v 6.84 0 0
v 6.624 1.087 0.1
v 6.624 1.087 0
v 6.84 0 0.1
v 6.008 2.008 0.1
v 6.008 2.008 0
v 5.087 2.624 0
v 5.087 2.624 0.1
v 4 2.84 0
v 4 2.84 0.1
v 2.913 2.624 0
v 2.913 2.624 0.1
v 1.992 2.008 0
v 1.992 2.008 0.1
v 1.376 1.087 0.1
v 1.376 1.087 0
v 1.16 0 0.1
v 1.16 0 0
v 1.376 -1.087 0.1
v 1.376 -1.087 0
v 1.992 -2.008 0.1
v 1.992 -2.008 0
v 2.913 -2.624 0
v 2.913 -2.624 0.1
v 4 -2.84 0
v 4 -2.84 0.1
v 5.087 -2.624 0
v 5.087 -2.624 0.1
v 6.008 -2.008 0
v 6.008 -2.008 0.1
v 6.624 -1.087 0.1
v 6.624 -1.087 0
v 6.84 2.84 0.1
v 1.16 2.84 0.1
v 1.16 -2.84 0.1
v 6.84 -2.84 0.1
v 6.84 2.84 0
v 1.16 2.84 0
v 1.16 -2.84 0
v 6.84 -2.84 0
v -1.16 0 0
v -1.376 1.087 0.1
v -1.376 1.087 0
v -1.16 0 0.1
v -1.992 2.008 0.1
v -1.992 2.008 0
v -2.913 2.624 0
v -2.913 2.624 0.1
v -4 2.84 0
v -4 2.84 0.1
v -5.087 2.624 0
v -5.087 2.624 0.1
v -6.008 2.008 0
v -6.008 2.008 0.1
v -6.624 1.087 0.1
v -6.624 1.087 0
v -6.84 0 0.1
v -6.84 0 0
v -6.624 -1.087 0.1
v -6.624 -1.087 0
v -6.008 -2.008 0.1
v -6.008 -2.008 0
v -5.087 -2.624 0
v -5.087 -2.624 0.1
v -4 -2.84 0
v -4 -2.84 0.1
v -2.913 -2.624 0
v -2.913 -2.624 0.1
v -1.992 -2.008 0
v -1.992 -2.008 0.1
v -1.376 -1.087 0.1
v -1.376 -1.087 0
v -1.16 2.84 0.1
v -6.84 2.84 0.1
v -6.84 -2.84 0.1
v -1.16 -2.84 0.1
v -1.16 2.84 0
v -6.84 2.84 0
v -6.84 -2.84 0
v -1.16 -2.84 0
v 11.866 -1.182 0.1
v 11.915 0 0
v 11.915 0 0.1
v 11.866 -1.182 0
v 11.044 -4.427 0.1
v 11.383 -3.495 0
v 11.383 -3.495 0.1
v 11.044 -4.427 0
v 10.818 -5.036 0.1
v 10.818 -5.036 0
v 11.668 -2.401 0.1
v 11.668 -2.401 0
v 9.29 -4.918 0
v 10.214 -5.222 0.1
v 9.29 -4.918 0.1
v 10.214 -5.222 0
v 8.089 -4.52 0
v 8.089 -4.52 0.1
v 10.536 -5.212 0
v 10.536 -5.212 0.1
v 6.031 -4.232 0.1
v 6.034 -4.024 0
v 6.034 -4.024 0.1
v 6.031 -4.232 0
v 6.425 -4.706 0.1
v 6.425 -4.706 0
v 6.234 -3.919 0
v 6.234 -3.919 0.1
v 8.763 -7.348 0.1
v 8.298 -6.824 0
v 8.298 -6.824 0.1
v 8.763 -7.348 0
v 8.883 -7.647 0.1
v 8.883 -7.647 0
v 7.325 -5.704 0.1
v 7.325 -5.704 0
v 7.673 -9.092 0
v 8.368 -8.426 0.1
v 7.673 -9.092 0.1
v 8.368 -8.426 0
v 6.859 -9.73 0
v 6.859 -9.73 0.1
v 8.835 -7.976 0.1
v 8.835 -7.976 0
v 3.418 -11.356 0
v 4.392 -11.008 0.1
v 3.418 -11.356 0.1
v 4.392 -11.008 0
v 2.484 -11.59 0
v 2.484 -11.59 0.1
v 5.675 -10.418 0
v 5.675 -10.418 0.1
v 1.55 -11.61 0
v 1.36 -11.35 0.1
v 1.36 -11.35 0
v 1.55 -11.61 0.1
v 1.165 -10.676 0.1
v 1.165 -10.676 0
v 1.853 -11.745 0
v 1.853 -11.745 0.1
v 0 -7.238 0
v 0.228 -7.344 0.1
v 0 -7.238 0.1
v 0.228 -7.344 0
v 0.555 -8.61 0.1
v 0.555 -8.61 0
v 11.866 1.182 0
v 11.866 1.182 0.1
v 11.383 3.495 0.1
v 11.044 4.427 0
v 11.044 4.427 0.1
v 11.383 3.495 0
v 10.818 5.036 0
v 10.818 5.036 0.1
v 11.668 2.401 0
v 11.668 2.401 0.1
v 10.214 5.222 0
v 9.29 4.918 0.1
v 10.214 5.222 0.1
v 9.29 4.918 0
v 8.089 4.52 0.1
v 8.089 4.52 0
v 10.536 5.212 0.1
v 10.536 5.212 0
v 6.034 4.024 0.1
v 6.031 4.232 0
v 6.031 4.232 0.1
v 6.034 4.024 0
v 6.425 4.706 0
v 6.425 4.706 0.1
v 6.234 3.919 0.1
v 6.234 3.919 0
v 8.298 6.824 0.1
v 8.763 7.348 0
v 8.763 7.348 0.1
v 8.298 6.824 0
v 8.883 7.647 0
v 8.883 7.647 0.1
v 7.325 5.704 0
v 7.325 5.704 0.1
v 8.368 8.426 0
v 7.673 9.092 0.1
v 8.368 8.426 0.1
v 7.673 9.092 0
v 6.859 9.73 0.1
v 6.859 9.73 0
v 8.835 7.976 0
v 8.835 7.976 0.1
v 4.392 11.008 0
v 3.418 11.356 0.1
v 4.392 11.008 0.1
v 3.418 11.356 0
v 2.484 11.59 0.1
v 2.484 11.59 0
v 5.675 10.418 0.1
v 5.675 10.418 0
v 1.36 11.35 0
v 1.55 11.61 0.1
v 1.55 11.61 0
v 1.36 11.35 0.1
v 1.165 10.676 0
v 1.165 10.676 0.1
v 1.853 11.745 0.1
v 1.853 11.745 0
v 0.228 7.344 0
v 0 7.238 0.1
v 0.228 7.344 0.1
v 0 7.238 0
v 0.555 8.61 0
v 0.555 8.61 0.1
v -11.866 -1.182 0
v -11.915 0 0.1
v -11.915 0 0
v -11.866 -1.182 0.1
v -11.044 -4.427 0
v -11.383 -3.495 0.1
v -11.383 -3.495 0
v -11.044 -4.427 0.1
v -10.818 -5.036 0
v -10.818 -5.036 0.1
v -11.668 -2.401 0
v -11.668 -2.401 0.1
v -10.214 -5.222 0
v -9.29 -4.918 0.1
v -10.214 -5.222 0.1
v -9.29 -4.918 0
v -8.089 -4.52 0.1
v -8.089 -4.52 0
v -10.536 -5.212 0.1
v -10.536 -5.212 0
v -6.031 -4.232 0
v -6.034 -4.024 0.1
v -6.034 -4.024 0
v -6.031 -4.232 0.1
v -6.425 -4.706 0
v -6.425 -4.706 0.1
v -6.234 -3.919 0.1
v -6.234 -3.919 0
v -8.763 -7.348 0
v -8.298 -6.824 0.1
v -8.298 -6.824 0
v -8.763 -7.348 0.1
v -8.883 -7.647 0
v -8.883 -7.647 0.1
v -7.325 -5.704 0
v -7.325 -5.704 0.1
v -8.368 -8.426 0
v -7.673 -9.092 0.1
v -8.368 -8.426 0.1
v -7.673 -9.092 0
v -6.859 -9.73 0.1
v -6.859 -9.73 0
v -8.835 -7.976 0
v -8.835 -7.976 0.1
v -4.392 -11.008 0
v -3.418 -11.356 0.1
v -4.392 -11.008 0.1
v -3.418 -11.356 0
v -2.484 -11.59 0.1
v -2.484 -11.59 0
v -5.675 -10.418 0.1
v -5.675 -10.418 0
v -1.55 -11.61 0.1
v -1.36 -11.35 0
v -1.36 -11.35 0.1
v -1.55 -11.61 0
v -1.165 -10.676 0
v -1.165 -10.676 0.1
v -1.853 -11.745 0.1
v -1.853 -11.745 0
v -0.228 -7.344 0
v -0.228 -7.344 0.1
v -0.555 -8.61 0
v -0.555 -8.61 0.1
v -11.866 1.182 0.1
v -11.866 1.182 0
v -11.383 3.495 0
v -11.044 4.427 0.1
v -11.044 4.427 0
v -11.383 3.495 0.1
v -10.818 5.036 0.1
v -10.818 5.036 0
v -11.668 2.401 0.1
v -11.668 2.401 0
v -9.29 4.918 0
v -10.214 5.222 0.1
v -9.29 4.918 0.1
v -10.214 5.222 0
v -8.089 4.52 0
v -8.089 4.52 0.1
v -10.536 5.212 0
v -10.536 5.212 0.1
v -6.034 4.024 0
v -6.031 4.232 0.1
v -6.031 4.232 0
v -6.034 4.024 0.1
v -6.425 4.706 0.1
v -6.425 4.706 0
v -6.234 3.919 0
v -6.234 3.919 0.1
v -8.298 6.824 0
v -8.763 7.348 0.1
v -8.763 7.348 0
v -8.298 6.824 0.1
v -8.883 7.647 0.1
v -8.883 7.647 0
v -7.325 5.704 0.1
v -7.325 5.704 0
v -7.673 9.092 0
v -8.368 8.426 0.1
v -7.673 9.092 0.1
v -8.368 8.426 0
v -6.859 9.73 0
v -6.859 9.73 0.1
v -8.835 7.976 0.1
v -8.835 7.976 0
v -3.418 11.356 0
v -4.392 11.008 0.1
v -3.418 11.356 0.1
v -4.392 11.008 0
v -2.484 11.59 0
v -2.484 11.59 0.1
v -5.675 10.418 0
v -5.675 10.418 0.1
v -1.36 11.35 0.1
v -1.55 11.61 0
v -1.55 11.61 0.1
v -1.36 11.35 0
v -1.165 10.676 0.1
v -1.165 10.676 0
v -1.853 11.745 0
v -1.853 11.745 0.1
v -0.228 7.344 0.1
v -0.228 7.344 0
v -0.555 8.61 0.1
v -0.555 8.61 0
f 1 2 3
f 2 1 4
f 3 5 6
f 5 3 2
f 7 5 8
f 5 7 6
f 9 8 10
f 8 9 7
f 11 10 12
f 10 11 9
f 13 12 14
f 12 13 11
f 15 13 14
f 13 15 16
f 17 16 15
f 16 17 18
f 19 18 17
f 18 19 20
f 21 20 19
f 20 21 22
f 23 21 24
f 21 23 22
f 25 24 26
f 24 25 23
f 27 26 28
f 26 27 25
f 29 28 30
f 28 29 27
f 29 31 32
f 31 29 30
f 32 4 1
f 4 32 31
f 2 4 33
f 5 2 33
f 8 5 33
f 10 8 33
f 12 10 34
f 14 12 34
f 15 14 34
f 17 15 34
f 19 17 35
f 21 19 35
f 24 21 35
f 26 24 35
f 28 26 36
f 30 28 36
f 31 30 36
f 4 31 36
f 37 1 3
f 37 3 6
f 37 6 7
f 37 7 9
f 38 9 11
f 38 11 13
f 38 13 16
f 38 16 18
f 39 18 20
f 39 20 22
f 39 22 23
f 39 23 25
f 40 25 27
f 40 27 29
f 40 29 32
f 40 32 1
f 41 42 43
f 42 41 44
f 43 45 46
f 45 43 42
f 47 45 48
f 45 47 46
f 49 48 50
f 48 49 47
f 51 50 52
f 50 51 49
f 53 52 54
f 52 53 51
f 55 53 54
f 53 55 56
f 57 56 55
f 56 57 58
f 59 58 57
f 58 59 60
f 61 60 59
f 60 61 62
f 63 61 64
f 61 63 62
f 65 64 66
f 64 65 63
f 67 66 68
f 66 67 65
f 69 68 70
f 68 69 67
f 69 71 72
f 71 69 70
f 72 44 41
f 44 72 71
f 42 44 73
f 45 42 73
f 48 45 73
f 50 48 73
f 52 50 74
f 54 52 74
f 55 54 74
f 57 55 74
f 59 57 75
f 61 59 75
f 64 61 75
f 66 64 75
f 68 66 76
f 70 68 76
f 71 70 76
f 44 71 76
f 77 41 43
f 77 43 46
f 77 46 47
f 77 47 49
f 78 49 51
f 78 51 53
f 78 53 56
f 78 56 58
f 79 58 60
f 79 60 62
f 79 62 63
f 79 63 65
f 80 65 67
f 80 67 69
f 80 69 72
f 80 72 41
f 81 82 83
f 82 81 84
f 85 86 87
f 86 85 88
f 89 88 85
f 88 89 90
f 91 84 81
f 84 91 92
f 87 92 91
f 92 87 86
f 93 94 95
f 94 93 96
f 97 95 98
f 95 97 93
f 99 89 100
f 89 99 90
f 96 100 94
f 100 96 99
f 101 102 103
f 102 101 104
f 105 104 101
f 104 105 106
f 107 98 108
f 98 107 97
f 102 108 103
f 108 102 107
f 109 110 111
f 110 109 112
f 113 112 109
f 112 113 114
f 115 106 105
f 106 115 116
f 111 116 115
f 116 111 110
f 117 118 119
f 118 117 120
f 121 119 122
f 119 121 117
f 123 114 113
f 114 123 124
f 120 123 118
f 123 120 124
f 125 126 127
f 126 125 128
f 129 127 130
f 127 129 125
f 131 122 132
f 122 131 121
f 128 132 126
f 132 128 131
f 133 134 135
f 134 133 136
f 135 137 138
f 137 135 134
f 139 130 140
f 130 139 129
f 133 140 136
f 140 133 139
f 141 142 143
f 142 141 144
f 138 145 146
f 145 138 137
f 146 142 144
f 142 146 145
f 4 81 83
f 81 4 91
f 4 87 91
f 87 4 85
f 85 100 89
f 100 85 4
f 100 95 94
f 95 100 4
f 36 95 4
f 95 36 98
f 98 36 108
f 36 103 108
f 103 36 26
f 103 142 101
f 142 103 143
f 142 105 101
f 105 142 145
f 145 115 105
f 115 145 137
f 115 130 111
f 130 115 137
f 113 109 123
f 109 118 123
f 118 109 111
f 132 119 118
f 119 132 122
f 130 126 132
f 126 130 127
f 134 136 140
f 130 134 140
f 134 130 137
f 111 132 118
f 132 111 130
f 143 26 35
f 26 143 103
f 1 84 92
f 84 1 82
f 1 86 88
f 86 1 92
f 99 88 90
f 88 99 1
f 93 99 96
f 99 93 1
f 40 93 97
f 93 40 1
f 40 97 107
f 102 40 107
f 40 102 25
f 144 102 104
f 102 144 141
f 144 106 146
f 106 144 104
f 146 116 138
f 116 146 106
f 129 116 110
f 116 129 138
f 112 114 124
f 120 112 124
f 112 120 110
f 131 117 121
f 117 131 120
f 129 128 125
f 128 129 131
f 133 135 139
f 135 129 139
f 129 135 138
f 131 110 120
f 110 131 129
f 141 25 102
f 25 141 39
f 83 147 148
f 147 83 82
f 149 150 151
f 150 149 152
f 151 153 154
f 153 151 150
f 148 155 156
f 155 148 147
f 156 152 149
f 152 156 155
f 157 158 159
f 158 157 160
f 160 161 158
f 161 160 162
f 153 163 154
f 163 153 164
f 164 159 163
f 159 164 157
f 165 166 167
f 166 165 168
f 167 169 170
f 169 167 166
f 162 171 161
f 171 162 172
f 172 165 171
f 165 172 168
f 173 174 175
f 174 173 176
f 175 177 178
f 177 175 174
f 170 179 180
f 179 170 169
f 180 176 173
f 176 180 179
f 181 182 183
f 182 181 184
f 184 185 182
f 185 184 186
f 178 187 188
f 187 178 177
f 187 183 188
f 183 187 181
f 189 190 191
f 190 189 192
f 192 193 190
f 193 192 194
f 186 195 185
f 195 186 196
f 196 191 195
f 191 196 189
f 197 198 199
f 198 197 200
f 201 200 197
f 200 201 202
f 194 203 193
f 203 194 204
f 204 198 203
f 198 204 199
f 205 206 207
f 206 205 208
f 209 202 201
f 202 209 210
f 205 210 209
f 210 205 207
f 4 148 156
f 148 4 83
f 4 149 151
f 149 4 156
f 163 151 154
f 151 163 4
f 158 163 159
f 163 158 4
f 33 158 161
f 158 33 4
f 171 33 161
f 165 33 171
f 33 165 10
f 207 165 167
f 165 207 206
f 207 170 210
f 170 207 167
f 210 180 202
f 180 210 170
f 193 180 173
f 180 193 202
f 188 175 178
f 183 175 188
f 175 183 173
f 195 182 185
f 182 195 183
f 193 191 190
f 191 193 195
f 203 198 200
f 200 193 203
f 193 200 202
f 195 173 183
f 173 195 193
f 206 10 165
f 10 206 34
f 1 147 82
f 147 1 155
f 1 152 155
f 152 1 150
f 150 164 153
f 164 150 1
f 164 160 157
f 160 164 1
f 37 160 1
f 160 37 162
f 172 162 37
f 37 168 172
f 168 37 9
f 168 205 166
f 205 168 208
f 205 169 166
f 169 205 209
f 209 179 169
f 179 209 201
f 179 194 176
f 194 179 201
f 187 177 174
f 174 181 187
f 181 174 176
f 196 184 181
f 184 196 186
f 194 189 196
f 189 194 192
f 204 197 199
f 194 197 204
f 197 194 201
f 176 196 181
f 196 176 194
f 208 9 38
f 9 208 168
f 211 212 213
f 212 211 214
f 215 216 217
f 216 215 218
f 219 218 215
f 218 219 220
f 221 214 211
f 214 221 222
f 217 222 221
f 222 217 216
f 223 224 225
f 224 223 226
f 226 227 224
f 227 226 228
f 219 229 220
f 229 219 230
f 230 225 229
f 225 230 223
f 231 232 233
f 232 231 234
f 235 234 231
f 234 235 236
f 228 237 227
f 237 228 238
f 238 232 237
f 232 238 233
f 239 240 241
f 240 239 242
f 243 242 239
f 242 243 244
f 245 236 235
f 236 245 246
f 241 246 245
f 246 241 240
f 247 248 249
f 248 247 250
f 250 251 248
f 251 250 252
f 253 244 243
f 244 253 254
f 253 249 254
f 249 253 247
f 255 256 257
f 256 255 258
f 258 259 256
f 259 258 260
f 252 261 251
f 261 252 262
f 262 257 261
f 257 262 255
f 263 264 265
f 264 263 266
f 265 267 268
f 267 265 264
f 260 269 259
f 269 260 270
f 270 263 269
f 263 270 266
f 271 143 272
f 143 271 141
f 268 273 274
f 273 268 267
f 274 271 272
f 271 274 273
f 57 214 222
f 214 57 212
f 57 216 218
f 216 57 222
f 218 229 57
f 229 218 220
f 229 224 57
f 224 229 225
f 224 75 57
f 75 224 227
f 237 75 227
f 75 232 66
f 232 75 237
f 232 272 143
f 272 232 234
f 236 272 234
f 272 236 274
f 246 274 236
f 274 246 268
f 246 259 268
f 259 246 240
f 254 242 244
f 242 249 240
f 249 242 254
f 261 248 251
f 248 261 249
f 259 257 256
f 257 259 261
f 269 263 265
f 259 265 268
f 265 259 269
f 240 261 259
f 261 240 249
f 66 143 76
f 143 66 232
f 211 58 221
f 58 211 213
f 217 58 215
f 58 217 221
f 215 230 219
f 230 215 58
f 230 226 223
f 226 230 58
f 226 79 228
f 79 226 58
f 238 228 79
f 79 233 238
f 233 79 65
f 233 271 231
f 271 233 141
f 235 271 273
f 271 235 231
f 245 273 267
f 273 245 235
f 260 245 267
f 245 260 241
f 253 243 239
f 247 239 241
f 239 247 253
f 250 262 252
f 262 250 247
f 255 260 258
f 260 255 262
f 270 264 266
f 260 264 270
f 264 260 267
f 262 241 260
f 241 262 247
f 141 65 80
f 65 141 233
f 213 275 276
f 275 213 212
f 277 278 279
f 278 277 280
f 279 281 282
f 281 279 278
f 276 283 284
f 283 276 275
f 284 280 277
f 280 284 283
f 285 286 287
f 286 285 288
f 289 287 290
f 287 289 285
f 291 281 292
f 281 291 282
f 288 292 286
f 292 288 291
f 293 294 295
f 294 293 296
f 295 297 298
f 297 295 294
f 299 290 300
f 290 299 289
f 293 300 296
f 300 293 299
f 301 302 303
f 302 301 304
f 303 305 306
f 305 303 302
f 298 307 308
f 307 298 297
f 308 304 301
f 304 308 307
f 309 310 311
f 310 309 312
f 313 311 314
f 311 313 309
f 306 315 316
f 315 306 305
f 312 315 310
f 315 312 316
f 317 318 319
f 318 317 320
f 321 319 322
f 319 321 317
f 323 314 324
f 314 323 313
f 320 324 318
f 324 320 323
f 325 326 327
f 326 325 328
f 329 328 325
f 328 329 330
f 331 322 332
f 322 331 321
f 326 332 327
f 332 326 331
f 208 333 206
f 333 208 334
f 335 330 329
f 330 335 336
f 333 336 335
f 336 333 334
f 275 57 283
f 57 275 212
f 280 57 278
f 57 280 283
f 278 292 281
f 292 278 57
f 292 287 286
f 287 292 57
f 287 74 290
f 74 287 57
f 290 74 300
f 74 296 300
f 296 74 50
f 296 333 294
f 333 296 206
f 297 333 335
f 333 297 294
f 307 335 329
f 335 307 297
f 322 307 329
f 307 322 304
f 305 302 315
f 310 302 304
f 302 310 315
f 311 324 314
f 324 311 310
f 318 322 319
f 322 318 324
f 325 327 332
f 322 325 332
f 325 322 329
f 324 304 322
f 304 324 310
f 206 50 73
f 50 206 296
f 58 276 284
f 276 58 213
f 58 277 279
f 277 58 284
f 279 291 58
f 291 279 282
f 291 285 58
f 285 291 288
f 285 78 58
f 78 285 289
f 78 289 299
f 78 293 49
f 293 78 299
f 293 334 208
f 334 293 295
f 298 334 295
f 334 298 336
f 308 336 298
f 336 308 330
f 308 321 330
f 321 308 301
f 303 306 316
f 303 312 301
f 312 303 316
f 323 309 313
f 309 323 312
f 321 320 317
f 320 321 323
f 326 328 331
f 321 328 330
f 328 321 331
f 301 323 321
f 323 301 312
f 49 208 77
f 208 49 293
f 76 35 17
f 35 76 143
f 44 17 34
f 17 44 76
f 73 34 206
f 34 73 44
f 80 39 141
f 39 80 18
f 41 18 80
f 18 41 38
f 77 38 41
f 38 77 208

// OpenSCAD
// file: ../p/4-4edge.scad
use <../lib.scad>
function ldraw_lib__4_4edge() = [
// 0 Circle 1.0
// 0 Name: 4-4edge.dat
// 0 Author: James Jessiman
// 0 !LDRAW_ORG Primitive UPDATE 2017-01
// 0 !LICENSE Licensed under CC BY 4.0 : see CAreadme.txt
// 
// 0 BFC CERTIFY CCW
  [0,"BFC","CERTIFY"],
  [0,"BFC","CCW"],
// 
// 0 !HISTORY 1998-12-15 [PTadmin] Official Update 1998-10
// 0 !HISTORY 2005-12-28 [PTadmin] Official Update 2005-01
// 0 !HISTORY 2007-06-24 [PTadmin] Header formatted for Contributor Agreement
// 0 !HISTORY 2008-07-01 [PTadmin] Official Update 2008-01
// 0 !HISTORY 2017-01-15 [Steffen] BFCed
// 0 !HISTORY 2017-12-30 [PTadmin] Official Update 2017-01
// 
// 
// 2 24 1 0 0 0.9239 0 0.3827
  [2,24,1,0,0,0.9239,0,0.3827],
// 2 24 0.9239 0 0.3827 0.7071 0 0.7071
  [2,24,0.9239,0,0.3827,0.7071,0,0.7071],
// 2 24 0.7071 0 0.7071 0.3827 0 0.9239
  [2,24,0.7071,0,0.7071,0.3827,0,0.9239],
// 2 24 0.3827 0 0.9239 0 0 1
  [2,24,0.3827,0,0.9239,0,0,1],
// 2 24 0 0 1 -0.3827 0 0.9239
  [2,24,0,0,1,-0.3827,0,0.9239],
// 2 24 -0.3827 0 0.9239 -0.7071 0 0.7071
  [2,24,-0.3827,0,0.9239,-0.7071,0,0.7071],
// 2 24 -0.7071 0 0.7071 -0.9239 0 0.3827
  [2,24,-0.7071,0,0.7071,-0.9239,0,0.3827],
// 2 24 -0.9239 0 0.3827 -1 0 -0
  [2,24,-0.9239,0,0.3827,-1,0,-0],
// 2 24 -1 0 -0 -0.9239 0 -0.3827
  [2,24,-1,0,-0,-0.9239,0,-0.3827],
// 2 24 -0.9239 0 -0.3827 -0.7071 0 -0.7071
  [2,24,-0.9239,0,-0.3827,-0.7071,0,-0.7071],
// 2 24 -0.7071 0 -0.7071 -0.3827 0 -0.9239
  [2,24,-0.7071,0,-0.7071,-0.3827,0,-0.9239],
// 2 24 -0.3827 0 -0.9239 0 0 -1
  [2,24,-0.3827,0,-0.9239,0,0,-1],
// 2 24 0 0 -1 0.3827 0 -0.9239
  [2,24,0,0,-1,0.3827,0,-0.9239],
// 2 24 0.3827 0 -0.9239 0.7071 0 -0.7071
  [2,24,0.3827,0,-0.9239,0.7071,0,-0.7071],
// 2 24 0.7071 0 -0.7071 0.9239 0 -0.3827
  [2,24,0.7071,0,-0.7071,0.9239,0,-0.3827],
// 2 24 0.9239 0 -0.3827 1 0 0
  [2,24,0.9239,0,-0.3827,1,0,0],
];
module ldraw_lib__4_4edge(step=0, col=false, unit=2/5, alt=false, line=0.2, solid=!$preview)
    makepoly(ldraw_lib__4_4edge(), step=step, col=col, unit=unit, alt=alt, line=line, solid=solid);
ldraw_lib__4_4edge(line=0.2);
// file: ../p/4-4cyli.scad
use <../lib.scad>
function ldraw_lib__4_4cyli() = [
// 0 Cylinder 1.0
// 0 Name: 4-4cyli.dat
// 0 Author: James Jessiman
// 0 !LDRAW_ORG Primitive UPDATE 2005-01
// 0 !LICENSE Licensed under CC BY 4.0 : see CAreadme.txt
// 
// 0 BFC CERTIFY CCW
  [0,"BFC","CERTIFY"],
  [0,"BFC","CCW"],
// 
// 0 !HISTORY 1998-12-15 [PTadmin] Official Update 1998-10
// 0 !HISTORY 2002-03-23 [sbliss] Added BFC statement; merged headers from files in distributions LDraw 0.27 and Complete.
// 0 !HISTORY 2002-04-25 [PTadmin] Official Update 2002-02
// 0 !HISTORY 2004-12-14 [guyvivan] BFC CCW
// 0 !HISTORY 2005-12-28 [PTadmin] Official Update 2005-01
// 0 !HISTORY 2007-06-24 [PTadmin] Header formatted for Contributor Agreement
// 0 !HISTORY 2008-07-01 [PTadmin] Official Update 2008-01
// 
// 
// 4 16 1 1 0 0.9239 1 0.3827 0.9239 0 0.3827 1 0 0
  [4,16,1,1,0,0.9239,1,0.3827,0.9239,0,0.3827,1,0,0],
// 5 24 1 0 0 1 1 0 0.9239 0 0.3827 0.9239 0 -0.3827
  [5,24,1,0,0,1,1,0,0.9239,0,0.3827,0.9239,0,-0.3827],
// 4 16 0.9239 1 0.3827 0.7071 1 0.7071 0.7071 0 0.7071 0.9239 0 0.3827
  [4,16,0.9239,1,0.3827,0.7071,1,0.7071,0.7071,0,0.7071,0.9239,0,0.3827],
// 5 24 0.9239 0 0.3827 0.9239 1 0.3827 0.7071 0 0.7071 1 0 0
  [5,24,0.9239,0,0.3827,0.9239,1,0.3827,0.7071,0,0.7071,1,0,0],
// 4 16 0.7071 1 0.7071 0.3827 1 0.9239 0.3827 0 0.9239 0.7071 0 0.7071
  [4,16,0.7071,1,0.7071,0.3827,1,0.9239,0.3827,0,0.9239,0.7071,0,0.7071],
// 5 24 0.7071 0 0.7071 0.7071 1 0.7071 0.3827 0 0.9239 0.9239 0 0.3827
  [5,24,0.7071,0,0.7071,0.7071,1,0.7071,0.3827,0,0.9239,0.9239,0,0.3827],
// 4 16 0.3827 1 0.9239 0 1 1 0 0 1 0.3827 0 0.9239
  [4,16,0.3827,1,0.9239,0,1,1,0,0,1,0.3827,0,0.9239],
// 5 24 0.3827 0 0.9239 0.3827 1 0.9239 0 0 1 0.7071 0 0.7071
  [5,24,0.3827,0,0.9239,0.3827,1,0.9239,0,0,1,0.7071,0,0.7071],
// 4 16 0 1 1 -0.3827 1 0.9239 -0.3827 0 0.9239 0 0 1
  [4,16,0,1,1,-0.3827,1,0.9239,-0.3827,0,0.9239,0,0,1],
// 5 24 0 0 1 0 1 1 -0.3827 0 0.9239 0.3827 0 0.9239
  [5,24,0,0,1,0,1,1,-0.3827,0,0.9239,0.3827,0,0.9239],
// 4 16 -0.3827 1 0.9239 -0.7071 1 0.7071 -0.7071 0 0.7071 -0.3827 0 0.9239
  [4,16,-0.3827,1,0.9239,-0.7071,1,0.7071,-0.7071,0,0.7071,-0.3827,0,0.9239],
// 5 24 -0.3827 0 0.9239 -0.3827 1 0.9239 -0.7071 0 0.7071 0 0 1
  [5,24,-0.3827,0,0.9239,-0.3827,1,0.9239,-0.7071,0,0.7071,0,0,1],
// 4 16 -0.7071 1 0.7071 -0.9239 1 0.3827 -0.9239 0 0.3827 -0.7071 0 0.7071
  [4,16,-0.7071,1,0.7071,-0.9239,1,0.3827,-0.9239,0,0.3827,-0.7071,0,0.7071],
// 5 24 -0.7071 0 0.7071 -0.7071 1 0.7071 -0.9239 0 0.3827 -0.3827 0 0.9239
  [5,24,-0.7071,0,0.7071,-0.7071,1,0.7071,-0.9239,0,0.3827,-0.3827,0,0.9239],
// 4 16 -0.9239 1 0.3827 -1 1 0 -1 0 0 -0.9239 0 0.3827
  [4,16,-0.9239,1,0.3827,-1,1,0,-1,0,0,-0.9239,0,0.3827],
// 5 24 -0.9239 0 0.3827 -0.9239 1 0.3827 -1 0 0 -0.7071 0 0.7071
  [5,24,-0.9239,0,0.3827,-0.9239,1,0.3827,-1,0,0,-0.7071,0,0.7071],
// 4 16 -1 1 0 -0.9239 1 -0.3827 -0.9239 0 -0.3827 -1 0 0
  [4,16,-1,1,0,-0.9239,1,-0.3827,-0.9239,0,-0.3827,-1,0,0],
// 5 24 -1 0 0 -1 1 0 -0.9239 0 -0.3827 -0.9239 0 0.3827
  [5,24,-1,0,0,-1,1,0,-0.9239,0,-0.3827,-0.9239,0,0.3827],
// 4 16 -0.9239 1 -0.3827 -0.7071 1 -0.7071 -0.7071 0 -0.7071 -0.9239 0 -0.3827
  [4,16,-0.9239,1,-0.3827,-0.7071,1,-0.7071,-0.7071,0,-0.7071,-0.9239,0,-0.3827],
// 5 24 -0.9239 0 -0.3827 -0.9239 1 -0.3827 -0.7071 0 -0.7071 -1 0 0
  [5,24,-0.9239,0,-0.3827,-0.9239,1,-0.3827,-0.7071,0,-0.7071,-1,0,0],
// 4 16 -0.7071 1 -0.7071 -0.3827 1 -0.9239 -0.3827 0 -0.9239 -0.7071 0 -0.7071
  [4,16,-0.7071,1,-0.7071,-0.3827,1,-0.9239,-0.3827,0,-0.9239,-0.7071,0,-0.7071],
// 5 24 -0.7071 0 -0.7071 -0.7071 1 -0.7071 -0.3827 0 -0.9239 -0.9239 0 -0.3827
  [5,24,-0.7071,0,-0.7071,-0.7071,1,-0.7071,-0.3827,0,-0.9239,-0.9239,0,-0.3827],
// 4 16 -0.3827 1 -0.9239 0 1 -1 0 0 -1 -0.3827 0 -0.9239
  [4,16,-0.3827,1,-0.9239,0,1,-1,0,0,-1,-0.3827,0,-0.9239],
// 5 24 -0.3827 0 -0.9239 -0.3827 1 -0.9239 0 0 -1 -0.7071 0 -0.7071
  [5,24,-0.3827,0,-0.9239,-0.3827,1,-0.9239,0,0,-1,-0.7071,0,-0.7071],
// 4 16 0 1 -1 0.3827 1 -0.9239 0.3827 0 -0.9239 0 0 -1
  [4,16,0,1,-1,0.3827,1,-0.9239,0.3827,0,-0.9239,0,0,-1],
// 5 24 0 0 -1 0 1 -1 0.3827 0 -0.9239 -0.3827 0 -0.9239
  [5,24,0,0,-1,0,1,-1,0.3827,0,-0.9239,-0.3827,0,-0.9239],
// 4 16 0.3827 1 -0.9239 0.7071 1 -0.7071 0.7071 0 -0.7071 0.3827 0 -0.9239
  [4,16,0.3827,1,-0.9239,0.7071,1,-0.7071,0.7071,0,-0.7071,0.3827,0,-0.9239],
// 5 24 0.3827 0 -0.9239 0.3827 1 -0.9239 0.7071 0 -0.7071 0 0 -1
  [5,24,0.3827,0,-0.9239,0.3827,1,-0.9239,0.7071,0,-0.7071,0,0,-1],
// 4 16 0.7071 1 -0.7071 0.9239 1 -0.3827 0.9239 0 -0.3827 0.7071 0 -0.7071
  [4,16,0.7071,1,-0.7071,0.9239,1,-0.3827,0.9239,0,-0.3827,0.7071,0,-0.7071],
// 5 24 0.7071 0 -0.7071 0.7071 1 -0.7071 0.9239 0 -0.3827 0.3827 0 -0.9239
  [5,24,0.7071,0,-0.7071,0.7071,1,-0.7071,0.9239,0,-0.3827,0.3827,0,-0.9239],
// 4 16 0.9239 1 -0.3827 1 1 0 1 0 0 0.9239 0 -0.3827
  [4,16,0.9239,1,-0.3827,1,1,0,1,0,0,0.9239,0,-0.3827],
// 5 24 0.9239 0 -0.3827 0.9239 1 -0.3827 1 0 0 0.7071 0 -0.7071
  [5,24,0.9239,0,-0.3827,0.9239,1,-0.3827,1,0,0,0.7071,0,-0.7071],
// 0
];
module ldraw_lib__4_4cyli(step=0, col=false, unit=2/5, alt=false, line=0.2, solid=!$preview)
    makepoly(ldraw_lib__4_4cyli(), step=step, col=col, unit=unit, alt=alt, line=line, solid=solid);
ldraw_lib__4_4cyli(line=0.2);
// file: ../p/4-4ndis.scad
use <../lib.scad>
function ldraw_lib__4_4ndis() = [
// 0 Disc Negative 1.0
// 0 Name: 4-4ndis.dat
// 0 Author: James Jessiman
// 0 !LDRAW_ORG Primitive UPDATE 2012-01
// 0 !LICENSE Licensed under CC BY 4.0 : see CAreadme.txt
// 
// 0 BFC CERTIFY CCW
  [0,"BFC","CERTIFY"],
  [0,"BFC","CCW"],
// 
// 0 !HISTORY 2002-03-23 [sbliss] Added BFC statement; compacted code
// 0 !HISTORY 2002-04-25 [PTadmin] Official Update 2002-02
// 0 !HISTORY 2007-06-24 [PTadmin] Header formatted for Contributor Agreement
// 0 !HISTORY 2008-07-01 [PTadmin] Official Update 2008-01
// 0 !HISTORY 2012-02-16 [Philo] Changed to CCW
// 0 !HISTORY 2012-03-30 [PTadmin] Official Update 2012-01
// 
// 
// 3 16 0.9239 0 0.3827 1 0 0 1 0 1
  [3,16,0.9239,0,0.3827,1,0,0,1,0,1],
// 3 16 0.7071 0 0.7071 0.9239 0 0.3827 1 0 1
  [3,16,0.7071,0,0.7071,0.9239,0,0.3827,1,0,1],
// 3 16 0.3827 0 0.9239 0.7071 0 0.7071 1 0 1
  [3,16,0.3827,0,0.9239,0.7071,0,0.7071,1,0,1],
// 3 16 0 0 1 0.3827 0 0.9239 1 0 1
  [3,16,0,0,1,0.3827,0,0.9239,1,0,1],
// 3 16 -0.3827 0 0.9239 0 0 1 -1 0 1
  [3,16,-0.3827,0,0.9239,0,0,1,-1,0,1],
// 3 16 -0.7071 0 0.7071 -0.3827 0 0.9239 -1 0 1
  [3,16,-0.7071,0,0.7071,-0.3827,0,0.9239,-1,0,1],
// 3 16 -0.9239 0 0.3827 -0.7071 0 0.7071 -1 0 1
  [3,16,-0.9239,0,0.3827,-0.7071,0,0.7071,-1,0,1],
// 3 16 -1 0 0 -0.9239 0 0.3827 -1 0 1
  [3,16,-1,0,0,-0.9239,0,0.3827,-1,0,1],
// 3 16 -0.9239 0 -0.3827 -1 0 0 -1 0 -1
  [3,16,-0.9239,0,-0.3827,-1,0,0,-1,0,-1],
// 3 16 -0.7071 0 -0.7071 -0.9239 0 -0.3827 -1 0 -1
  [3,16,-0.7071,0,-0.7071,-0.9239,0,-0.3827,-1,0,-1],
// 3 16 -0.3827 0 -0.9239 -0.7071 0 -0.7071 -1 0 -1
  [3,16,-0.3827,0,-0.9239,-0.7071,0,-0.7071,-1,0,-1],
// 3 16 0 0 -1 -0.3827 0 -0.9239 -1 0 -1
  [3,16,0,0,-1,-0.3827,0,-0.9239,-1,0,-1],
// 3 16 0.3827 0 -0.9239 0 0 -1 1 0 -1
  [3,16,0.3827,0,-0.9239,0,0,-1,1,0,-1],
// 3 16 0.7071 0 -0.7071 0.3827 0 -0.9239 1 0 -1
  [3,16,0.7071,0,-0.7071,0.3827,0,-0.9239,1,0,-1],
// 3 16 0.9239 0 -0.3827 0.7071 0 -0.7071 1 0 -1
  [3,16,0.9239,0,-0.3827,0.7071,0,-0.7071,1,0,-1],
// 3 16 1 0 0 0.9239 0 -0.3827 1 0 -1
  [3,16,1,0,0,0.9239,0,-0.3827,1,0,-1],
];
module ldraw_lib__4_4ndis(step=0, col=false, unit=2/5, alt=false, line=0.2, solid=!$preview)
    makepoly(ldraw_lib__4_4ndis(), step=step, col=col, unit=unit, alt=alt, line=line, solid=solid);
ldraw_lib__4_4ndis(line=0.2);
// file: ../p/4-4cylo.scad
use <../lib.scad>
use <4-4cyli.scad>
use <4-4edge.scad>
function ldraw_lib__4_4cylo() = [
// 0 Cylinder Open 1.0
// 0 Name: 4-4cylo.dat
// 0 Author: Mark Kennedy [mkennedy]
// 0 !LDRAW_ORG Primitive UPDATE 2010-01
// 0 !LICENSE Licensed under CC BY 4.0 : see CAreadme.txt
// 
// 0 BFC CERTIFY CCW
  [0,"BFC","CERTIFY"],
  [0,"BFC","CCW"],
// 
// 0 !HISTORY 2010-04-05 [PTadmin] Official Update 2010-01
// 
// 
// 1 16 0 0 0 1 0 0 0 1 0 0 0 1 4-4edge.dat
  [1,16,0,0,0,1,0,0,0,1,0,0,0,1, ldraw_lib__4_4edge()],
// 1 16 0 1 0 1 0 0 0 1 0 0 0 1 4-4edge.dat
  [1,16,0,1,0,1,0,0,0,1,0,0,0,1, ldraw_lib__4_4edge()],
// 1 16 0 0 0 1 0 0 0 1 0 0 0 1 4-4cyli.dat
  [1,16,0,0,0,1,0,0,0,1,0,0,0,1, ldraw_lib__4_4cyli()],
// 0
];
module ldraw_lib__4_4cylo(step=0, col=false, unit=2/5, alt=false, line=0.2, solid=!$preview)
    makepoly(ldraw_lib__4_4cylo(), step=step, col=col, unit=unit, alt=alt, line=line, solid=solid);
ldraw_lib__4_4cylo(line=0.2);
// main file
use <../lib.scad>
use <../p/4-4cylo.scad>
use <../p/4-4ndis.scad>
use <s/75674s01.scad>
function ldraw_lib__75674() = [
// 0 Minifig Skirt Round Roman
// 0 Name: 75674.dat
// 0 Author: Magnus Forsberg [MagFors]
// 0 !LDRAW_ORG Part UPDATE 2026-02
// 0 !LICENSE Licensed under CC BY 4.0 : see CAreadme.txt
// 
// 0 BFC CERTIFY CCW
  [0,"BFC","CERTIFY"],
  [0,"BFC","CCW"],
// 
// 0 !CATEGORY Sheet Fabric
// 
// 0 !KEYWORDS Brickowl 79053
// 
// 0 !HISTORY 2026-03-06 [OrionP] Official Update 2026-02
// 
// 0 BFC INVERTNEXT
  [0,"BFC","INVERTNEXT"],
// 1 16 10 -.25 0 7.1 0 0 0 .25 0 0 0 7.1 4-4cylo.dat
  [1,16,10,-.25,0,7.1,0,0,0,.25,0,0,0,7.1, ldraw_lib__4_4cylo()],
// 1 16 10 -.25 0 7.1 0 0 0 1 0 0 0 7.1 4-4ndis.dat
  [1,16,10,-.25,0,7.1,0,0,0,1,0,0,0,7.1, ldraw_lib__4_4ndis()],
// 1 16 10 0 0 7.1 0 0 0 -1 0 0 0 7.1 4-4ndis.dat
  [1,16,10,0,0,7.1,0,0,0,-1,0,0,0,7.1, ldraw_lib__4_4ndis()],
// 0 BFC INVERTNEXT
  [0,"BFC","INVERTNEXT"],
// 1 16 -10 -.25 0 7.1 0 0 0 .25 0 0 0 7.1 4-4cylo.dat
  [1,16,-10,-.25,0,7.1,0,0,0,.25,0,0,0,7.1, ldraw_lib__4_4cylo()],
// 1 16 -10 -.25 0 7.1 0 0 0 1 0 0 0 7.1 4-4ndis.dat
  [1,16,-10,-.25,0,7.1,0,0,0,1,0,0,0,7.1, ldraw_lib__4_4ndis()],
// 1 16 -10 0 0 7.1 0 0 0 -1 0 0 0 7.1 4-4ndis.dat
  [1,16,-10,0,0,7.1,0,0,0,-1,0,0,0,7.1, ldraw_lib__4_4ndis()],
// 1 16 0 0 0 1 0 0 0 1 0 0 0 1 s\75674s01.dat
  [1,16,0,0,0,1,0,0,0,1,0,0,0,1, ldraw_lib__s__75674s01()],
// 1 16 0 0 0 1 0 0 0 1 0 0 0 -1 s\75674s01.dat
  [1,16,0,0,0,1,0,0,0,1,0,0,0,-1, ldraw_lib__s__75674s01()],
// 1 16 0 0 0 -1 0 0 0 1 0 0 0 1 s\75674s01.dat
  [1,16,0,0,0,-1,0,0,0,1,0,0,0,1, ldraw_lib__s__75674s01()],
// 1 16 0 0 0 -1 0 0 0 1 0 0 0 -1 s\75674s01.dat
  [1,16,0,0,0,-1,0,0,0,1,0,0,0,-1, ldraw_lib__s__75674s01()],
// 4 16 0 -.25 -18.094 2.9 -.25 -7.1 2.9 -.25 0 -2.9 -.25 -7.1
  [4,16,0,-.25,-18.094,2.9,-.25,-7.1,2.9,-.25,0,-2.9,-.25,-7.1],
// 4 16 -2.9 -.25 0 -2.9 -.25 -7.1 2.9 -.25 0 2.9 -.25 7.1
  [4,16,-2.9,-.25,0,-2.9,-.25,-7.1,2.9,-.25,0,2.9,-.25,7.1],
// 4 16 2.9 -.25 7.1 0 -.25 18.094 -2.9 -.25 7.1 -2.9 -.25 0
  [4,16,2.9,-.25,7.1,0,-.25,18.094,-2.9,-.25,7.1,-2.9,-.25,0],
// 4 16 2.9 0 0 2.9 0 -7.1 0 0 -18.094 -2.9 0 -7.1
  [4,16,2.9,0,0,2.9,0,-7.1,0,0,-18.094,-2.9,0,-7.1],
// 4 16 2.9 0 0 -2.9 0 -7.1 -2.9 0 0 2.9 0 7.1
  [4,16,2.9,0,0,-2.9,0,-7.1,-2.9,0,0,2.9,0,7.1],
// 4 16 -2.9 0 7.1 0 0 18.094 2.9 0 7.1 -2.9 0 0
  [4,16,-2.9,0,7.1,0,0,18.094,2.9,0,7.1,-2.9,0,0],
// 5 24 0 0 -18.094 0 -.25 -18.094 -.57 -.25 -18.359 .57 -.25 -18.359
  [5,24,0,0,-18.094,0,-.25,-18.094,-.57,-.25,-18.359,.57,-.25,-18.359],
// 5 24 29.788 -.25 0 29.788 0 0 29.664 -.25 -2.956 29.664 -.25 2.956
  [5,24,29.788,-.25,0,29.788,0,0,29.664,-.25,-2.956,29.664,-.25,2.956],
// 5 24 -29.788 -.25 0 -29.788 0 0 -29.664 -.25 2.956 -29.664 -.25 -2.956
  [5,24,-29.788,-.25,0,-29.788,0,0,-29.664,-.25,2.956,-29.664,-.25,-2.956],
// 5 24 0 -.25 18.094 0 0 18.094 .57 -.25 18.359 -.57 -.25 18.359
  [5,24,0,-.25,18.094,0,0,18.094,.57,-.25,18.359,-.57,-.25,18.359],
];
module ldraw_lib__75674(step=0, col=false, unit=2/5, alt=false, line=0.2, solid=!$preview)
    makepoly(ldraw_lib__75674(), step=step, col=col, unit=unit, alt=alt, line=line, solid=solid);
ldraw_lib__75674(line=0.2);
